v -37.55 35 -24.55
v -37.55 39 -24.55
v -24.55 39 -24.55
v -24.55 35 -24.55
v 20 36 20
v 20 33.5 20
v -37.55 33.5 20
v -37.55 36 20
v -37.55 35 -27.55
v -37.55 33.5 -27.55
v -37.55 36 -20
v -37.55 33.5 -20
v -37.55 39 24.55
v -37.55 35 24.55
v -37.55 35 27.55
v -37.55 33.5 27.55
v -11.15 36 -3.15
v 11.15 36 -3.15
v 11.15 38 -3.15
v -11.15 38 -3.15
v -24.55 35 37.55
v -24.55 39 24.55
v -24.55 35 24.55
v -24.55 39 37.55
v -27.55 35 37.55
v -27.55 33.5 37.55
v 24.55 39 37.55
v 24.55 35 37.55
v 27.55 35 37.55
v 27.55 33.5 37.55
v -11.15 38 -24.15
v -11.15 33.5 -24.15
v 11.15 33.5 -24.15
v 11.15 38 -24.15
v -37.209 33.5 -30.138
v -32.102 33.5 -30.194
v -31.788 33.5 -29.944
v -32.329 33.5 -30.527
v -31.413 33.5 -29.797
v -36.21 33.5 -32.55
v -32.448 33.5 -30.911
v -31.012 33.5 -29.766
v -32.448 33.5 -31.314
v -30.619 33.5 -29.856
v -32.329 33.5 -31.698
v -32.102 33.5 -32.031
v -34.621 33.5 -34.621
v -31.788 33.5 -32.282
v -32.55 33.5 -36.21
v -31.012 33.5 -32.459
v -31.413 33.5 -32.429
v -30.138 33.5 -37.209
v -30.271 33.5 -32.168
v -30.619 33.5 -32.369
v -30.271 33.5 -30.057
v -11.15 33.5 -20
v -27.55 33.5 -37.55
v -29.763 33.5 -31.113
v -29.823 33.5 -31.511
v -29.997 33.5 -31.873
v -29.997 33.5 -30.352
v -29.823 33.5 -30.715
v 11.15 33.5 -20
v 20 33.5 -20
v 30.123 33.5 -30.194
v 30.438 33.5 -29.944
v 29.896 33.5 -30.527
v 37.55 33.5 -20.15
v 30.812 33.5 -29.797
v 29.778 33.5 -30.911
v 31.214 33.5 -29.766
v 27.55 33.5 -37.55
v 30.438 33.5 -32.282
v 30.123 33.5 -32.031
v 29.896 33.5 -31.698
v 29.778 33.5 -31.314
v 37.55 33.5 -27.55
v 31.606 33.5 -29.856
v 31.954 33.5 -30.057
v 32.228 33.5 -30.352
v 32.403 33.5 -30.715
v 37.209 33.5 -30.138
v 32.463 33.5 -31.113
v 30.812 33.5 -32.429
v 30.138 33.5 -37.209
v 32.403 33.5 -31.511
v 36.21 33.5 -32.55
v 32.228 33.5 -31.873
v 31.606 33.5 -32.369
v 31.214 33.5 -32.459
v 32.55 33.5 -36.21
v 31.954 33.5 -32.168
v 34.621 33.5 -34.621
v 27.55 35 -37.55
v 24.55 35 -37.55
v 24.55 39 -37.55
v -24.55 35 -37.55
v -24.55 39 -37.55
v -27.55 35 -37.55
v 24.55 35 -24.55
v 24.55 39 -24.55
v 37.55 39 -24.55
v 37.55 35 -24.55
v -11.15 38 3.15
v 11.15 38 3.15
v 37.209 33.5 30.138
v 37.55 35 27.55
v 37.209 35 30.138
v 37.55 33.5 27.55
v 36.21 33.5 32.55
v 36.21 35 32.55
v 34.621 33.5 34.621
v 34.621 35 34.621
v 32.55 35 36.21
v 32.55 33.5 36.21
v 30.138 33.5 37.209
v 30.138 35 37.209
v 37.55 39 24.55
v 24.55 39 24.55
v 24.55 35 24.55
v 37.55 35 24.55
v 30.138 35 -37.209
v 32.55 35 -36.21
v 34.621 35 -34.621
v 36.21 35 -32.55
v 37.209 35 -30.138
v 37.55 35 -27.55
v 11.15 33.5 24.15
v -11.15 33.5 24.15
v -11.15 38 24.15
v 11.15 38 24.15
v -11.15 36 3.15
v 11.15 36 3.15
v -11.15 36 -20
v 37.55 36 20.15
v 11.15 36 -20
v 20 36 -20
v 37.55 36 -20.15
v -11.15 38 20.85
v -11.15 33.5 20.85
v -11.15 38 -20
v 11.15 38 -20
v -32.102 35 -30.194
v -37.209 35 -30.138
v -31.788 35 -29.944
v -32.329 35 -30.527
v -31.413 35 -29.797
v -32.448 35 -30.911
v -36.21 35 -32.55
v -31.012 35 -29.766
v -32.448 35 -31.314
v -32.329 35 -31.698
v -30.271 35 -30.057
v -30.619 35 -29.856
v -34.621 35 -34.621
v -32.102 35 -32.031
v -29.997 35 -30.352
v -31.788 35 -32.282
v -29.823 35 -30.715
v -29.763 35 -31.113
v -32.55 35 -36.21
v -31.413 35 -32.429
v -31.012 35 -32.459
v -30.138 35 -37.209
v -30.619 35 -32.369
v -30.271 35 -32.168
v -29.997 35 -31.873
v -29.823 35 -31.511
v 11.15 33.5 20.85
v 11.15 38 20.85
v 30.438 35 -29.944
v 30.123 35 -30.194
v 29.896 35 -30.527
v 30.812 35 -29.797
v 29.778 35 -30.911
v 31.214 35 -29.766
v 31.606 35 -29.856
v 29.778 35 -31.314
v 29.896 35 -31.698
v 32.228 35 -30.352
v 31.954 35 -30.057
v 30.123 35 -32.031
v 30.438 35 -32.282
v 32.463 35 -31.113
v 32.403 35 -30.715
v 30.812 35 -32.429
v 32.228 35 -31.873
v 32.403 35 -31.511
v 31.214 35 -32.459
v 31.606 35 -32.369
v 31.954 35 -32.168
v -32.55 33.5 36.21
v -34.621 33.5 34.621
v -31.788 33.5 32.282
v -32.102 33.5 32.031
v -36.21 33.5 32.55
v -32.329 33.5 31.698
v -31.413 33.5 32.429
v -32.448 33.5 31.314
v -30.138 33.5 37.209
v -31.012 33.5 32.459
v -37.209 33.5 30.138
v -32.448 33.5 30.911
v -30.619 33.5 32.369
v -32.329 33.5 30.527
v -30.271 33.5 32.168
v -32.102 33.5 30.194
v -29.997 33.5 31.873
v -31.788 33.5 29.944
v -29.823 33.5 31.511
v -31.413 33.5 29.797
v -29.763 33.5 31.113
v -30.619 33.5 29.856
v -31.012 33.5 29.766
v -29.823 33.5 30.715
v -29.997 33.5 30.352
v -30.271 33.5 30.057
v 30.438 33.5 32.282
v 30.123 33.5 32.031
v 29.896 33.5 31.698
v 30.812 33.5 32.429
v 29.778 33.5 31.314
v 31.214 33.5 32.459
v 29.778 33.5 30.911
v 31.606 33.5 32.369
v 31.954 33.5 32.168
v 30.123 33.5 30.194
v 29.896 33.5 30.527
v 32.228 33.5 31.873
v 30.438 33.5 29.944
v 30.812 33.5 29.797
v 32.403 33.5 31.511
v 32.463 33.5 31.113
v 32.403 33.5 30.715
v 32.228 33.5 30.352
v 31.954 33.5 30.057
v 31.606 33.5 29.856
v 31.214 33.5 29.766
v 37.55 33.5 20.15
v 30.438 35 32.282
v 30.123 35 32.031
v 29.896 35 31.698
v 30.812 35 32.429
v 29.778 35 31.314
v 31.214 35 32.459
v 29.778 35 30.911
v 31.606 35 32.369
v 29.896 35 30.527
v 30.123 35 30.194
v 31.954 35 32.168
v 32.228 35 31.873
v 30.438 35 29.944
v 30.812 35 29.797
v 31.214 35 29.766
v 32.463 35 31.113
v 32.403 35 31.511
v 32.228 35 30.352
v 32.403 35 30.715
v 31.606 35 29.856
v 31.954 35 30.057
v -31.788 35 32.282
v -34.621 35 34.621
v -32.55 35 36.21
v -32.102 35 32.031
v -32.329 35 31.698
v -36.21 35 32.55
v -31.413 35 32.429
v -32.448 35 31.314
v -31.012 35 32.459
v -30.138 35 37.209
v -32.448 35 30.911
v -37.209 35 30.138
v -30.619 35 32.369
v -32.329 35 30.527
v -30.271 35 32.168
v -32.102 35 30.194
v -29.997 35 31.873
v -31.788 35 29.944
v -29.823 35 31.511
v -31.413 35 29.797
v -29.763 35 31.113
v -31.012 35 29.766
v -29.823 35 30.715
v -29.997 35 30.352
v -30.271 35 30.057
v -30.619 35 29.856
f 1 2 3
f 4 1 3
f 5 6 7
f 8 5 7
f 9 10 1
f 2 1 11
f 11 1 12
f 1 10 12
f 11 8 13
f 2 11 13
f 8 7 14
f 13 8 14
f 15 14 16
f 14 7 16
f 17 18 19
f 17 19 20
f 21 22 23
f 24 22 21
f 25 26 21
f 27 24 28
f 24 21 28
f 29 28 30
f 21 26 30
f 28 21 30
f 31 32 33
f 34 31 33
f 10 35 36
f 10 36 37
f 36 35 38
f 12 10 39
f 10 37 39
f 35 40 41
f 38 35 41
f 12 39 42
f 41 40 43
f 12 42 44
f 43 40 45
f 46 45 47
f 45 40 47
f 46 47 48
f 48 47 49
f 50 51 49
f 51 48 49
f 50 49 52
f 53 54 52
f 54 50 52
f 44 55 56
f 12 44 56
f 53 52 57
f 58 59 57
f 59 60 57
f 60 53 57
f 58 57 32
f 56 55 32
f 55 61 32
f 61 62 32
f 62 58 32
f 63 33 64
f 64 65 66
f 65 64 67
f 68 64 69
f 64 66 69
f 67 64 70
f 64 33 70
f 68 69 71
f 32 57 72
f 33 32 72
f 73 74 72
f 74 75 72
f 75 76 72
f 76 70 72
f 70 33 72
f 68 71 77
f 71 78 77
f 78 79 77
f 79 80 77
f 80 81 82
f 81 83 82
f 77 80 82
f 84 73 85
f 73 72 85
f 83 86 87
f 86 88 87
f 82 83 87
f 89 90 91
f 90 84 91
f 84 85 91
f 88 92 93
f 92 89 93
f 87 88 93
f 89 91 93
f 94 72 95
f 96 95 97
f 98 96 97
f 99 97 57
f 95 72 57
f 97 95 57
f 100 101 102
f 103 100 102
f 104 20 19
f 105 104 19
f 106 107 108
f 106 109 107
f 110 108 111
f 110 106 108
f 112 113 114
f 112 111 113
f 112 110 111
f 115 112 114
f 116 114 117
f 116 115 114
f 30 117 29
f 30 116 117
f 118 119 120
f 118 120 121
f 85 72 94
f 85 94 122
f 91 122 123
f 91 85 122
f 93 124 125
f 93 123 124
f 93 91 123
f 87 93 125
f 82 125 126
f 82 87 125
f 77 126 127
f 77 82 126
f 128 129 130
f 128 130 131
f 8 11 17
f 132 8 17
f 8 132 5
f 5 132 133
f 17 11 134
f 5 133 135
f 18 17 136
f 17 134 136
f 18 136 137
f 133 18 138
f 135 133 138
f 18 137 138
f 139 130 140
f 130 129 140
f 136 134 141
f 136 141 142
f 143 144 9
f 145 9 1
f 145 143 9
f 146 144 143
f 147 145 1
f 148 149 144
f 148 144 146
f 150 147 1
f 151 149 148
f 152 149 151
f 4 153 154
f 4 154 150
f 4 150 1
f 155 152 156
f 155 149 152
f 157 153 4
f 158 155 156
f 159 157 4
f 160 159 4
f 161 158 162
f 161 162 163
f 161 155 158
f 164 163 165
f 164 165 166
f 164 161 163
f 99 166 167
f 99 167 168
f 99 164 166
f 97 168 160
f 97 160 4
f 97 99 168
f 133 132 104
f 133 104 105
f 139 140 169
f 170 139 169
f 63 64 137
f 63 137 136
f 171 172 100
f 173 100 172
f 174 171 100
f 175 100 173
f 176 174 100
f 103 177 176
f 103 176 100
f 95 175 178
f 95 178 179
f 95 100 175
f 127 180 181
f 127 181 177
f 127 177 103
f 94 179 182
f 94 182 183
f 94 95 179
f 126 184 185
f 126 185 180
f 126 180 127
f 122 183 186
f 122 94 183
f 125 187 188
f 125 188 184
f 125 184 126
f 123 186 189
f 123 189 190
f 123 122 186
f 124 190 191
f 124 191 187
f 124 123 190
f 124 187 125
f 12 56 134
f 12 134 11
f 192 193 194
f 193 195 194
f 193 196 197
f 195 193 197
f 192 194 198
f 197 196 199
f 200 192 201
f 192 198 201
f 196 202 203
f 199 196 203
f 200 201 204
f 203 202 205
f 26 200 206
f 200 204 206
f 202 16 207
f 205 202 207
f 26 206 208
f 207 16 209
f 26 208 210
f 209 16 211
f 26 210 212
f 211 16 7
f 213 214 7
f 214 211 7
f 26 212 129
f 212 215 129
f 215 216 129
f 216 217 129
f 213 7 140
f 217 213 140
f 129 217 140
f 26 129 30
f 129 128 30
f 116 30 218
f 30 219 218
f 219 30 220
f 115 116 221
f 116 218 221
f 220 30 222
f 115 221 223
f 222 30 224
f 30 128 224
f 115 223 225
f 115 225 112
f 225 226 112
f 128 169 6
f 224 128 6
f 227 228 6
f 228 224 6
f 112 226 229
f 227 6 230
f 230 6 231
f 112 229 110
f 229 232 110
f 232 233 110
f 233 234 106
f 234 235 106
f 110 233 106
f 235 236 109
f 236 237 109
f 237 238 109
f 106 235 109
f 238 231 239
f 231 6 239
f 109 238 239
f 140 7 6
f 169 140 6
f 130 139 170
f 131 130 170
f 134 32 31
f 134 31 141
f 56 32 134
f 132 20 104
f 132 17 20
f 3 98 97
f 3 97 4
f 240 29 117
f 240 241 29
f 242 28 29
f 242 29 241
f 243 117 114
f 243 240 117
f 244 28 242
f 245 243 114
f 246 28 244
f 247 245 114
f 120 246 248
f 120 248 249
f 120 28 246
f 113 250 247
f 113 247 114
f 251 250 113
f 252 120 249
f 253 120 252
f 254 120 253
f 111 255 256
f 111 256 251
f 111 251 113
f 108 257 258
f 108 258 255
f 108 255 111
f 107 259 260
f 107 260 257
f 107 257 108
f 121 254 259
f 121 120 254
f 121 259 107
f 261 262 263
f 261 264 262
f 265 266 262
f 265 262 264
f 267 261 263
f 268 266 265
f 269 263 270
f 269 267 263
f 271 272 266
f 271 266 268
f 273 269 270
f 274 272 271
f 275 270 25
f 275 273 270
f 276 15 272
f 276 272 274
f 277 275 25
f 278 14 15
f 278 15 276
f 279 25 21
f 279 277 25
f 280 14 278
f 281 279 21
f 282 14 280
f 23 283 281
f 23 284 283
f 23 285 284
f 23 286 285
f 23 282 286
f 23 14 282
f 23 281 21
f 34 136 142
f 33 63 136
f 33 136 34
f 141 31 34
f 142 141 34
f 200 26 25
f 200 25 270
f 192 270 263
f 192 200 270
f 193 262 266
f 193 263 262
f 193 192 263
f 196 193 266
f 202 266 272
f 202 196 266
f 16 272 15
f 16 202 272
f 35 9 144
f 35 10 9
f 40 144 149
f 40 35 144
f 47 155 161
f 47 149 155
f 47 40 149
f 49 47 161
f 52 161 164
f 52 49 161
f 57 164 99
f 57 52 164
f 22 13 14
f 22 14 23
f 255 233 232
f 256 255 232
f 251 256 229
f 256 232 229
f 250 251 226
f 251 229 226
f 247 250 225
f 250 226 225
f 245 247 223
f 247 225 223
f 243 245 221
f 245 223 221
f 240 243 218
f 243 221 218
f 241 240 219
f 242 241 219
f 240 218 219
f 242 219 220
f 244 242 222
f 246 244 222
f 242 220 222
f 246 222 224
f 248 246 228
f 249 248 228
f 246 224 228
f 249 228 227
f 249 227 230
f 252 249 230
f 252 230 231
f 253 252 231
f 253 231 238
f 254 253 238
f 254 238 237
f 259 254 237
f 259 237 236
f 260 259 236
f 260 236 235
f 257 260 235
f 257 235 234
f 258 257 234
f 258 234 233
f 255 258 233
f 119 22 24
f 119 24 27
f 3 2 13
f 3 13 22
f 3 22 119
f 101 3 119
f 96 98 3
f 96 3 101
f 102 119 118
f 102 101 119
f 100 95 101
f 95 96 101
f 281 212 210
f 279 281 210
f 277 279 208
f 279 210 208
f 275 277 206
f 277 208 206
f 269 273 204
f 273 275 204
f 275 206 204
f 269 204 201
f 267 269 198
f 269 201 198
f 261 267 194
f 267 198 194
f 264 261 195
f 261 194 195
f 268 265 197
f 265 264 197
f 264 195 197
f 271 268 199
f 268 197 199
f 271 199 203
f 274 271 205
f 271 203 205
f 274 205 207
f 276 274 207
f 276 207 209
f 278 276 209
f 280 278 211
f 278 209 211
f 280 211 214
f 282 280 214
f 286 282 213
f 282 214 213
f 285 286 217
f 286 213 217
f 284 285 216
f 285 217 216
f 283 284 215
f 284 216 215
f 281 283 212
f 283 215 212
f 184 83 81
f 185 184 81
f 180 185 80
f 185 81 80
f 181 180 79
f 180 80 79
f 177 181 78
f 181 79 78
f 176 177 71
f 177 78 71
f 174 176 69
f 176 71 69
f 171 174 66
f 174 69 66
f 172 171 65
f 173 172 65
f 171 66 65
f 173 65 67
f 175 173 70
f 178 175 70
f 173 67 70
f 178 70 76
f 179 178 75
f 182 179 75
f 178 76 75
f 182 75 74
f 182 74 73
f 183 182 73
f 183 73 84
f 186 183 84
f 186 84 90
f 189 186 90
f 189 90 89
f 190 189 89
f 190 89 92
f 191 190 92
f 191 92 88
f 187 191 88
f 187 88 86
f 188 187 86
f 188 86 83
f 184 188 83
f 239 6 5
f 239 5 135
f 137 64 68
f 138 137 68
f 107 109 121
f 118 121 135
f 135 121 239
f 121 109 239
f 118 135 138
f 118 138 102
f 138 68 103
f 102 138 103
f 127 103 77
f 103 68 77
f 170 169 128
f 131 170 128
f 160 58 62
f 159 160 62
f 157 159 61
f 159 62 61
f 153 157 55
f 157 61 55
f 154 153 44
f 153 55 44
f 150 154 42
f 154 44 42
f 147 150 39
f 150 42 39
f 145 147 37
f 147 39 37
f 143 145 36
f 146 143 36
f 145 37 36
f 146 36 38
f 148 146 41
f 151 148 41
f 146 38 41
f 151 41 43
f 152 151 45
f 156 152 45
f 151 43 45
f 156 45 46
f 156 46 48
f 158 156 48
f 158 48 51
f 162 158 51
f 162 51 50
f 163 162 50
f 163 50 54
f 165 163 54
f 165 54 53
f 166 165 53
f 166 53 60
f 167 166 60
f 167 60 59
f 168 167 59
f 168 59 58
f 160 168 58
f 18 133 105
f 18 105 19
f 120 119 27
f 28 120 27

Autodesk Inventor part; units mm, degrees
ref_plane "YZ Plane" through (0, 0, 0) normal (1, 0, 0) x (0, 1, 0)
ref_plane "XZ Plane" through (0, 0, 0) normal (0, 1, 0) x (-1, 0, 0)
ref_plane "XY Plane" through (0, 0, 0) normal (0, 0, 1) x (1, 0, 0)
sketch "スケッチ1" plane through (0, 0, 0) normal (0, 1, 0) x (-1, 0, 0)
  line L0 (37.55, 37.55) -> (-37.55, 37.55)
  line L1 (-37.55, 37.55) -> (-37.55, -37.55)
  line L2 (-37.55, -37.55) -> (37.55, -37.55)
  line L3 (37.55, -37.55) -> (37.55, 37.55)
  line L4 (37.55, 37.55) -> (-37.55, -37.55) construction
  line L5 (-37.55, 37.55) -> (37.55, -37.55) construction
  line L6 (36.55, 36.55) -> (-36.55, 36.55)
  line L7 (-36.55, 36.55) -> (-36.55, -36.55)
  line L8 (-36.55, -36.55) -> (36.55, -36.55)
  line L9 (36.55, -36.55) -> (36.55, 36.55)
  line L10 (52.57, 0) -> (-52.57, 0) construction
  line L11 (0, -52.57) -> (0, 52.57) construction
  line L12 (14, -25) -> (-14, -25)
  line L13 (-14, -25) -> (-14, -35.5)
  line L14 (-14, -35.5) -> (14, -35.5)
  line L15 (14, -35.5) -> (14, -25)
  line L16 (14, -25) -> (-14, -35.5) construction
  line L17 (-14, -25) -> (14, -35.5) construction
  line L18 (0, 37.55) -> (0, -37.55) construction
  circle A0 centre (-13.68, -10.17) radius 1.6
  line L19 (14, -30.25) -> (-14, -30.25) construction
  line L20 (-11.15, 0) -> (-11.15, -24)
  line L21 (11.15, -24) -> (11.15, 0)
  line L22 (-11.15, 12.7) -> (-36.55, 12.7)
  line L23 (-36.55, 12.7) -> (-36.55, -12.7) construction
  line L24 (-36.55, -12.7) -> (-11.15, -12.7)
  line L25 (-11.15, -12.7) -> (-11.15, 12.7) construction
  line L26 (-11.15, 12.7) -> (-36.55, -12.7) construction
  line L27 (-36.55, 12.7) -> (-11.15, -12.7) construction
  line L28 (-13.68, 10.17) -> (-34.02, 10.17) construction
  line L29 (-34.02, 10.17) -> (-34.02, -10.17) construction
  line L30 (-34.02, -10.17) -> (-13.68, -10.17) construction
  line L31 (-13.68, -10.17) -> (-13.68, 10.17) construction
  line L32 (-13.68, 10.17) -> (-34.02, -10.17) construction
  line L33 (-34.02, 10.17) -> (-13.68, -10.17) construction
  circle A1 centre (-13.68, 10.17) radius 1.6
  circle A2 centre (-34.02, 10.17) radius 1.6
  circle A3 centre (-34.02, -10.17) radius 1.6
  line L34 (11.15, 0) -> (-11.15, 0) construction
  line L35 (11.15, -24) -> (-11.15, -24)
  line L36 (8.8, -24) -> (-8.8, -24) construction
  line L37 (-8.8, -24) -> (-8.8, -27)
  line L38 (-8.8, -27) -> (8.8, -27)
  line L39 (8.8, -27) -> (8.8, -24)
  line L40 (8.8, -24) -> (-8.8, -27) construction
  line L41 (-8.8, -24) -> (8.8, -27) construction
  line L42 (11.15, -3) -> (12, -3)
  line L43 (12, -3) -> (12, -9)
  line L44 (12, -9) -> (11.15, -9)
  line L45 (11.15, -12) -> (-11.15, -12) construction
  line L46 (12, -6) -> (-12, -6) construction
  line L47 (11.15, -21) -> (12, -21)
  line L48 (12, -21) -> (12, -15)
  line L49 (12, -15) -> (11.15, -15)
  line L50 (-11.15, -3) -> (-12, -3)
  line L51 (-12, -3) -> (-12, -9)
  line L52 (-12, -9) -> (-11.15, -9)
  line L53 (-12, -15) -> (-11.15, -15)
  line L54 (-12, -21) -> (-12, -15)
  line L55 (-11.15, -21) -> (-12, -21)
  line L56 (14, 25) -> (-14, 25)
  line L57 (-14, 25) -> (-14, 35.5)
  line L58 (-14, 35.5) -> (14, 35.5)
  line L59 (14, 35.5) -> (14, 25)
  line L60 (-11.15, 0) -> (-11.15, 24)
  line L61 (11.15, 24) -> (11.15, 0)
  line L62 (11.15, 24) -> (-11.15, 24)
  line L63 (8.8, 24) -> (-8.8, 24) construction
  line L64 (-8.8, 24) -> (-8.8, 27)
  line L65 (-8.8, 27) -> (8.8, 27)
  line L66 (8.8, 27) -> (8.8, 24)
  line L67 (11.15, 3) -> (12, 3)
  line L68 (12, 3) -> (12, 9)
  line L69 (12, 9) -> (11.15, 9)
  line L70 (12, 15) -> (11.15, 15)
  line L71 (12, 21) -> (12, 15)
  line L72 (11.15, 21) -> (12, 21)
  line L73 (-12, 3) -> (-12, 9)
  line L74 (-11.15, 3) -> (-12, 3)
  line L75 (-12, 9) -> (-11.15, 9)
  line L76 (-12, 21) -> (-12, 15)
  line L77 (-12, 15) -> (-11.15, 15)
  line L78 (-11.15, 21) -> (-12, 21)
  line L79 (15, 33.5) -> (29, 33.5)
  line L80 (29, 33.5) -> (29, -33.5)
  line L81 (29, -33.5) -> (15, -33.5)
  line L82 (15, -33.5) -> (15, 33.5)
  line L83 (15, 33.5) -> (29, -33.5) construction
  line L84 (29, 33.5) -> (15, -33.5) construction
  line L85 (-33.85, 20) -> (-13.85, 20)
  line L86 (-13.85, 20) -> (-13.85, -20)
  line L87 (-13.85, -20) -> (-33.85, -20)
  line L88 (-33.85, -20) -> (-33.85, 20)
  line L89 (-33.85, 20) -> (-13.85, -20) construction
  line L90 (-13.85, 20) -> (-33.85, -20) construction
  line L91 (37.55, 25.5) -> (15, 25.5) construction
  circle A4 centre (-21, -30.25) radius 3.1
  line L92 (-21, -37.55) -> (-21, 37.55) construction
  circle A5 centre (-21, 30.25) radius 3.1
  circle A6 centre (21, -30.25) radius 3.1
  circle A7 centre (21, 30.25) radius 3.1
  circle A8 centre (-21, -30.25) radius 4.1
  circle A9 centre (-21, 30.25) radius 4.1
  circle A10 centre (21, -30.25) radius 4.1
  circle A11 centre (21, 30.25) radius 4.1
  circle A12 centre (33, 0) radius 2.6
  circle A13 centre (33, 0) radius 3.5
  circle A14 centre (-33, 0) radius 2.6
  circle A15 centre (-33, 0) radius 3.5
  line L93 (-27.85, 4) -> (-19.85, 4)
  line L94 (-19.85, 4) -> (-19.85, -4)
  line L95 (-19.85, -4) -> (-27.85, -4)
  line L96 (-27.85, -4) -> (-27.85, 4)
  line L97 (-27.85, 4) -> (-19.85, -4) construction
  line L98 (-19.85, 4) -> (-27.85, -4) construction
  line L99 (26, -34) -> (18, -34)
  line L100 (18, -34) -> (18, -33.5)
  line L101 (18, -33.5) -> (26, -33.5) construction
  line L102 (26, -33.5) -> (26, -34)
  line L103 (26, -34) -> (18, -33.5) construction
  line L104 (18, -34) -> (26, -33.5) construction
  line L105 (22, -33.5) -> (22, 33.5) construction
  line L106 (-11.15, 24) -> (-11.15, 25)
  line L107 (11.15, 24) -> (11.15, 25)
  line L108 (11.15, -24) -> (11.15, -25)
  line L109 (-11.15, -24) -> (-11.15, -25)
  line L110 (14, 25) -> (14, 24)
  line L111 (14, 24) -> (11.15, 24)
  line L112 (-11.15, 24) -> (-14, 24)
  line L113 (-14, 24) -> (-14, 25)
  line L114 (14, -25) -> (14, -24)
  line L115 (14, -24) -> (11.15, -24)
  line L116 (-11.15, -24) -> (-14, -24)
  line L117 (-14, -24) -> (-14, -25)
  point P0 (0, 0)
  point P1 (0, -30.25)
  point P2 (-23.85, 0)
  point P3 (0, -25.5)
  point P4 (0, 0)
  point P5 (0, -6)
  point P6 (-12, 6)
  point P7 (12, 6)
  point P8 (22, 0)
  point P9 (-23.85, 0)
  point P10 (22, -33.75)
  dimension "d1" = 1
  dimension "d2" = 10.5
  dimension "d3" = 28
  dimension "d5" = 3.2
  dimension "d11" = 25.4
  dimension "d12" = 20.34
  dimension "d15" = 360
  dimension "d18" = 22.3
  dimension "d19" = 17.6
  dimension "d20" = 27
  dimension "d21" = 24
  dimension "d22" = 1
  dimension "d25" = 24
  dimension "d26" = 12
  dimension "d27" = 6
  dimension "d32" = 67
  dimension "d33" = 14
  dimension "d34" = 1
  dimension "d35" = 40
  dimension "d36" = 20
  dimension "d41" = 8
  dimension "d47" = 6.2
  dimension "d48" = 7
  dimension "d49" = 1
  dimension "d54" = 5.2
  dimension "d55" = 7
  dimension "d56" = 33
  dimension "d86" = 8
  dimension "d110" = 8
  dimension "d111" = 0.5
extrude "押し出し3" add sketch "スケッチ1" along normal blind 33.5 contours L3 L2 L1 L0 | L9 L8 L7 L24 L88 L87 L86 L20 L53 L54 L55 L116 L117 L13 L14 L15 L114 L115 L21 L47 L48 L49 L44 L43 L42 L61 L67 L68 L69 L70 L71 L72 L111 L110 L59 L58 L57 L113 L112 L60 L78 L76 L77 L22 L85 L6 | L22 L88 A2 A15 A3 L24 L7 | L88 L85 L86 L22 | L22 L86 A1 A0 L24 L88 A3 A15 A2 | L24 L86 L87 L88 | L22 L60 L75 L73 L74 L20 L50 L51 L52 L24 L86 A0 A1 | L88 A2 | A2 L88 | L88 A3 | A3 L88 | L60 L62 L61 L21 L35 L20 | L86 A1 | A1 L86 | L86 A0 | A0 L86 | L60 L74 L73 L75 | L77 L76 L78 L60 | A15 L88 A14 | L88 A14 A15 | L52 L51 L50 L20 | L20 L55 L54 L53 | A14 L88 | L88 A14 | L106 L56 L64 L62 | L112 L113 L56 L106 | L35 L37 L12 L109 | L109 L12 L117 L116 | L64 L56 L66 L62 | L56 L57 L58 L59 L66 L65 L64 | L35 L39 L12 L37 | L12 L37 L38 L39 L15 L14 L13 | L66 L56 L107 L62 | L64 L65 L66 L56 | L35 L108 L12 L39 | L12 L39 L38 L37 | L107 L56 L110 L111 | L115 L114 L12 L108 | L72 L71 L70 L61 | L21 L49 L48 L47 | L69 L68 L67 L61 | L21 L42 L43 L44 | L79 A11 L80 L81 A10 L82 | A11 L79 | L79 A11 | L81 A10 L99 L100 | A10 L81 | L81 A10 L99 | L81 L102 L99 A10 | L99 A10 | A4 | A5 | A6 | A7 | A8 | A9 | A12 | A13 | L93 L94 L95 L96
fillet "フィレット1" radius 10 4 edges at (37.55, 16.75, 37.55) (37.55, 16.75, -37.55) (-37.55, 16.75, -37.55) (-37.55, 16.75, 37.55)
extrude "押し出し11" cut sketch "スケッチ1" along normal through all contours L56 L57 L58 L59 L66 L65 L64 | L12 L37 L38 L39 L15 L14 L13 | L64 L65 L66 L56 | L12 L39 L38 L37
extrude "押し出し12" cut sketch "スケッチ1" along normal blind 1.5 contours A4 | A5 | A6 | A7
extrude "押し出し13" cut sketch "スケッチ1" along normal blind 1.5 contours A14 L88 | L88 A14 | A12
sketch "スケッチ5" plane through (0, 0, 0) normal (0, 1, 0) x (-1, 0, 0)
  line L0 (-12, 9) -> (-11.15, 9) projected
  line L1 (-11.15, 0) -> (-11.15, 24) projected
  line L2 (-12, 3) -> (-12, 9) projected
  line L3 (-11.15, 3) -> (-12, 3) projected
  line L4 (-12, 15) -> (-11.15, 15) projected
  line L5 (-12, 21) -> (-12, 15) projected
  line L6 (11.15, 3) -> (12, 3) projected
  line L7 (-11.15, 21) -> (-12, 21) projected
  line L8 (11.15, 21) -> (12, 21) projected
  line L9 (11.15, 24) -> (-11.15, 24) projected
  line L10 (-8.8, 24) -> (-8.8, 27) projected
  line L11 (8.8, 24) -> (-8.8, 24) construction
  line L12 (8.8, 27) -> (8.8, 24) projected
  line L13 (-8.8, 27) -> (8.8, 27) projected
  line L14 (11.15, 0) -> (-11.15, 0) construction
  line L15 (11.15, -12) -> (-11.15, -12) construction
  line L16 (12, -9) -> (11.15, -9) projected
  line L17 (11.15, -3) -> (12, -3) projected
  line L18 (12, -3) -> (12, -9) projected
  line L19 (12, -6) -> (-12, -6) construction
  line L20 (-12, -9) -> (-11.15, -9) projected
  line L21 (-12, -3) -> (-12, -9) projected
  line L22 (-11.15, -3) -> (-12, -3) projected
  line L23 (-11.15, -12.7) -> (-11.15, 12.7) construction
  line L24 (-11.15, 0) -> (-11.15, -24) projected
  line L25 (11.15, -24) -> (11.15, 0) projected
  line L26 (12, -15) -> (11.15, -15) projected
  line L27 (12, -21) -> (12, -15) projected
  line L28 (12, 9) -> (11.15, 9) projected
  line L29 (12, 3) -> (12, 9) projected
  line L30 (12, 15) -> (11.15, 15) projected
  line L31 (12, 21) -> (12, 15) projected
  line L32 (11.15, 24) -> (11.15, 0) projected
  line L33 (11.15, -24) -> (-11.15, -24) projected
  line L34 (8.8, -24) -> (-8.8, -24) construction
  line L35 (-12, -15) -> (-11.15, -15) projected
  line L36 (-12, -21) -> (-12, -15) projected
  line L37 (-11.15, -21) -> (-12, -21) projected
  line L38 (11.15, -21) -> (12, -21) projected
  line L39 (-8.8, -27) -> (8.8, -27) projected
  line L40 (-8.8, -24) -> (-8.8, -27) projected
  line L41 (8.8, -27) -> (8.8, -24) projected
  line L42 (-11.15, -14.85) -> (-12.15, -14.85)
  line L43 (-12.15, -14.85) -> (-12.15, -21.15)
  line L44 (-12.15, -21.15) -> (-11.15, -21.15)
  line L45 (-11.15, -9.15) -> (-12.15, -9.15)
  line L46 (-12.15, -9.15) -> (-12.15, -2.85)
  line L47 (-12.15, -2.85) -> (-11.15, -2.85)
  line L48 (11.15, -14.85) -> (12.15, -14.85)
  line L49 (12.15, -14.85) -> (12.15, -21.15)
  line L50 (12.15, -21.15) -> (11.15, -21.15)
  line L51 (11.15, -9.15) -> (12.15, -9.15)
  line L52 (12.15, -9.15) -> (12.15, -2.85)
  line L53 (12.15, -2.85) -> (11.15, -2.85)
  line L54 (-11.15, 9.15) -> (-12.15, 9.15)
  line L55 (-12.15, 9.15) -> (-12.15, 2.85)
  line L56 (-12.15, 2.85) -> (-11.15, 2.85)
  line L57 (-11.15, 14.85) -> (-12.15, 14.85)
  line L58 (-12.15, 14.85) -> (-12.15, 21.15)
  line L59 (-12.15, 21.15) -> (-11.15, 21.15)
  line L60 (11.15, 14.85) -> (12.15, 14.85)
  line L61 (12.15, 14.85) -> (12.15, 21.15)
  line L62 (12.15, 21.15) -> (11.15, 21.15)
  line L63 (-11.3, -24.15) -> (-11.3, 0)
  line L64 (-11.3, 0) -> (-11.3, 24.15)
  line L65 (-11.3, 24.15) -> (11.3, 24.15)
  line L66 (11.3, 24.15) -> (11.3, 0)
  line L67 (11.3, 0) -> (11.3, -24.15)
  line L68 (11.3, -24.15) -> (-11.3, -24.15)
  line L69 (8.95, 27.15) -> (8.95, 23.85)
  line L70 (8.95, 23.85) -> (-8.95, 23.85)
  line L71 (-8.95, 23.85) -> (-8.95, 27.15)
  line L72 (-8.95, 27.15) -> (8.95, 27.15)
  line L73 (8.95, -27.15) -> (-8.95, -27.15)
  line L74 (-8.95, -27.15) -> (-8.95, -23.85)
  line L75 (-8.95, -23.85) -> (8.95, -23.85)
  line L76 (8.95, -23.85) -> (8.95, -27.15)
  line L77 (11.15, 9.15) -> (12.15, 9.15)
  line L78 (12.15, 9.15) -> (12.15, 2.85)
  line L79 (12.15, 2.85) -> (11.15, 2.85)
  point P0 (0, 0)
  point P1 (0, 0)
  point P2 (-12, 6)
  point P3 (12, 6)
  point P4 (0, -6)
  point P5 (0, 0)
  point P6 (-11.3, -14.85)
  point P7 (-11.3, -21.15)
  point P8 (-8.95, -24.15)
  point P9 (8.95, -24.15)
  point P10 (11.3, -21.15)
  point P11 (11.3, -14.85)
  point P12 (11.3, -9.15)
  point P13 (11.3, -2.85)
  point P14 (11.3, 2.85)
  point P15 (11.3, 9.15)
  point P16 (11.3, 14.85)
  point P17 (11.3, 21.15)
  point P18 (8.95, 24.15)
  point P19 (-8.95, 24.15)
  point P20 (-11.3, 21.15)
  point P21 (-11.3, 14.85)
  point P22 (-11.3, 9.15)
  point P23 (-11.3, 2.85)
  point P24 (-11.3, -2.85)
  point P25 (-11.3, -9.15)
  dimension "d73" = 0.15
  dimension "d74" = 0.15
  dimension "d75" = 0.15
  dimension "d76" = 0.15
  dimension "d77" = 0.15
  dimension "d78" = 0.15
  dimension "d79" = 0.15
  dimension "d80" = 0.15
  dimension "d81" = 0.15
  dimension "d82" = 0.15
  dimension "d83" = 0.15
extrude "押し出し14" cut sketch "スケッチ5" against normal blind 31.5 from surface at 33.5
sketch "スケッチ6" plane through (0, 0, 0) normal (0, 1, 0) x (-1, 0, 0)
  line L0 (-11.15, 12.7) -> (-36.55, 12.7) projected
  circle A0 centre (-13.68, 10.17) radius 1.6 projected
  line L1 (-11.15, 0) -> (-11.15, 24) projected
  line L2 (-11.15, 0) -> (-11.15, -24) projected
  line L3 (-36.55, -12.7) -> (-11.15, -12.7) projected
  line L4 (-36.55, 12.7) -> (-36.55, -12.7) construction
  circle A1 centre (-34.02, -10.17) radius 1.6 projected
  circle A2 centre (-34.02, 10.17) radius 1.6 projected
  circle A3 centre (-13.68, -10.17) radius 1.6 projected
  line L5 (-11.15, 12.85) -> (-36.7, 12.85)
  line L6 (-36.7, 12.85) -> (-36.7, -12.85)
  line L7 (-36.7, -12.85) -> (-11.15, -12.85)
  circle A4 centre (-13.68, 10.17) radius 3
  circle A5 centre (-34.02, 10.17) radius 3
  circle A6 centre (-13.68, -10.17) radius 3
  circle A7 centre (-34.02, -10.17) radius 3
  point P0 (0, 0)
  point P1 (-36.7, -11.5182)
  point P2 (-36.7, -8.8218)
  point P3 (-32.6718, -12.85)
  point P4 (-35.3682, -12.85)
  point P5 (-36.7, 8.8218)
  point P6 (-36.7, 11.5182)
  point P7 (-35.3682, 12.85)
  point P8 (-32.6718, 12.85)
  dimension "d89" = 0.15
  dimension "d92" = 6
extrude "押し出し16" cut sketch "スケッチ6" against normal blind 19.5 from surface at 33.5 contours L1 A4 L0 | L0 A4 L5 L1 | A4 L1 L0 | L0 A4 L5 | A4 L1 L2 A6 L3 A7 L6 A5 L0 | L0 A5 L5 A4 | A5 L6 L0 | L0 A5 L5 | A5 L6 L5 | L5 A5 | L2 A6 L3 | L6 A5 | L2 L3 A6 | A6 L7 A7 L3 | L3 A6 L7 | A7 L3 L6 | L6 A7 | L2 L7 A6 L3 | A7 L7 L3 | A7 L7 L6 | A7 L7 | A0 | A1 | A2 | A3
extrude "押し出し15" cut sketch "スケッチ1" along normal through all contours L88 A2 | A2 L88 | L88 A3 | A3 L88 | L86 A1 | A1 L86 | L86 A0 | A0 L86 | L93 L94 L95 L96
extrude "押し出し17" cut sketch "スケッチ6" along normal blind 4 contours A5 L6 L0 | L0 A5 L5 | L5 A5 | L6 A5 | A7 L3 L6 | L6 A7 | A7 L7 L3 | A7 L7 | A1 | A2
sketch "スケッチ7" plane through (0, 0, 0) normal (0, 1, 0) x (-1, 0, 0)
  line L0 (-33.85, 20) -> (-13.85, 20) projected
  line L1 (-13.85, 20) -> (-13.85, -20) projected
  line L2 (-33.85, -20) -> (-33.85, 20) projected
  line L3 (-13.85, -20) -> (-33.85, -20) projected
  line L4 (-13.7, 20.15) -> (-34, 20.15)
  line L5 (-34, 20.15) -> (-34, -20.15)
  line L6 (-34, -20.15) -> (-13.7, -20.15)
  line L7 (-13.7, -20.15) -> (-13.7, 20.15)
  point P0 (0, 0)
  dimension "d95" = 0.15
extrude "押し出し18" cut sketch "スケッチ7" against normal blind 14.5 from surface at 33.5 contours L0 L1 L3 L2 | L7 L6 L5 L4
sketch "スケッチ9" plane through (0, 0, 0) normal (0, 1, 0) x (-1, 0, 0)
  line L0 (29, 33.5) -> (29, -33.5) projected
  line L1 (29, -33.5) -> (15, -33.5) projected
  line L2 (15, -33.5) -> (15, 33.5) projected
  line L3 (15, 33.5) -> (29, 33.5) projected
  line L4 (29.15, -33.65) -> (29.15, 33.65)
  line L5 (29.15, 33.65) -> (14.85, 33.65)
  line L6 (14.85, 33.65) -> (14.85, -33.65)
  line L7 (14.85, -33.65) -> (29.15, -33.65)
  line L8 (15, -33.5) -> (15, -33.65)
  line L9 (15, 33.5) -> (15, 33.65)
  line L10 (26, -33.5) -> (26, -34) projected
  line L11 (26, -34) -> (18, -34) projected
  line L12 (18, -34) -> (18, -33.5) projected
  line L13 (16, -33.5) -> (16, -36)
  line L14 (16, -36) -> (28, -36)
  line L15 (28, -36) -> (28, -33.5)
  line L16 (28, -36) -> (28, -39.9042)
  line L17 (28, -39.9042) -> (16, -39.9042)
  line L18 (16, -39.9042) -> (16, -36)
  line L19 (17, -33.5) -> (17, -35)
  line L20 (17, -35) -> (27, -35)
  line L21 (27, -35) -> (27, -33.5)
  point P0 (0, 0)
  point P1 (22, -33.5)
  point P2 (18, -33.65)
  point P3 (26, -33.65)
  point P4 (17, -33.65)
  point P5 (27, -33.65)
  dimension "d109" = 0.15
  dimension "d113" = 12
  dimension "d116" = 10
extrude "押し出し21" cut sketch "スケッチ9" against normal blind 31.25 from surface at 33.5 contours L3 L9 L5 L4 L7 L15 L1 L0 | L0 L1 L2 L3 | L2 L8 L7 L6 L5 L9 | L15 L7 L21 L1 | L1 L13 L7 L8 | L21 L7 L10 L1 | L1 L19 L7 L13 | L10 L7 L12 L1 | L21 L20 L19 L7 L12 L11 L10 | L1 L12 L7 L19 | L10 L11 L12 L7
sketch "スケッチ8" plane through (0, 0, 0) normal (1, 0, 0) x (0, 1, 0)
  line L0 (-10.4294, 0) -> (62.5761, 0) construction
  line L1 (0, -52.2157) -> (0, 71.794) construction
  line L2 (30.25, -33.5) -> (3.25, -33.5)
  line L3 (3.25, -33.5) -> (3.25, 33.5)
  line L4 (3.25, 33.5) -> (30.25, 33.5)
  line L5 (30.25, 33.5) -> (30.25, -33.5)
  line L6 (30.25, -33.5) -> (3.25, 33.5) construction
  line L7 (3.25, -33.5) -> (30.25, 33.5) construction
  line L8 (31.25, -34.5) -> (2.25, -34.5)
  line L9 (2.25, -34.5) -> (2.25, 34.5)
  line L10 (2.25, 34.5) -> (31.25, 34.5)
  line L11 (31.25, 34.5) -> (31.25, -34.5)
  line L12 (20.75, 33.5) -> (12.75, 33.5) construction
  line L13 (12.75, 33.5) -> (12.75, 34)
  line L14 (12.75, 34) -> (20.75, 34)
  line L15 (20.75, 34) -> (20.75, 33.5)
  line L16 (20.75, 33.5) -> (12.75, 34) construction
  line L17 (12.75, 33.5) -> (20.75, 34) construction
  line L18 (16.75, -33.5) -> (16.75, 33.5) construction
  line L19 (52.1468, -21.2895) -> (31.25, -21.2895)
  line L20 (31.25, -21.2895) -> (31.25, 21.2895) construction
  line L21 (31.25, 21.2895) -> (52.1468, 21.2895)
  line L22 (52.1468, 21.2895) -> (52.1468, -21.2895)
  line L23 (52.1468, -21.2895) -> (31.25, 21.2895) construction
  line L24 (31.25, -21.2895) -> (52.1468, 21.2895) construction
  line L25 (22.75, 33.5) -> (10.75, 33.5) construction
  line L26 (10.75, 33.5) -> (10.75, 54.0784)
  line L27 (10.75, 54.0784) -> (22.75, 54.0784)
  line L28 (22.75, 54.0784) -> (22.75, 33.5)
  line L29 (22.75, 33.5) -> (10.75, 54.0784) construction
  line L30 (10.75, 33.5) -> (22.75, 54.0784) construction
  line L31 (31.25, -26) -> (2.25, -26)
  line L32 (31.25, 26) -> (2.25, 26)
  point P0 (0, 0)
  point P1 (16.75, 0)
  point P2 (16.75, 33.75)
  point P3 (41.6984, 0)
  point P4 (16.75, 43.7892)
  point P5 (10.75, 34.5)
  point P6 (22.75, 34.5)
  point P7 (30.25, 26)
  point P8 (3.25, 26)
  point P9 (3.25, -26)
  point P10 (30.25, -26)
  dimension "d98" = 27
  dimension "d99" = 67
  dimension "d100" = 1
  dimension "d101" = 0.5
  dimension "d102" = 8
  dimension "d103" = 16.75
  dimension "d106" = 12
  dimension "d117" = 26
extrude "押し出し22" cut sketch "スケッチ8" against normal blind 31.25 from surface at -29.15 contours L31 L3 L32 L5 | L5 L32 L11 L31 | L11 L21 L22 L19
sketch "スケッチ10" plane through (0, 0, 0) normal (0, 0, 1) x (1, 0, 0)
  line L0 (-15, 22.75) -> (-29, 22.75)
  line L1 (-29, 22.75) -> (-29, 10.75)
  line L2 (-29, 10.75) -> (-15, 10.75)
  line L3 (-15, 10.75) -> (-15, 22.75)
  line L4 (-15, 22.75) -> (-29, 10.75) construction
  line L5 (-29, 22.75) -> (-15, 10.75) construction
  line L6 (-34.8, 0) -> (5.8, 0) construction
  point P0 (0, 0)
  point P1 (-15, 0)
  point P2 (-15, 0)
  point P3 (-15, 0)
  point P4 (-22, 16.75)
  dimension "d120" = 14
  dimension "d121" = 12
  dimension "d122" = 16.75
  dimension "d123" = 7
extrude "押し出し23" cut sketch "スケッチ10" along normal through all both and the other way through all
sketch "スケッチ11" plane through (0, 0, 0) normal (0, 1, 0) x (-1, 0, 0)
  circle A0 centre (31.1127, 31.1127) radius 1.35
  line L0 (37.55, 37.55) -> (-37.55, -37.55) construction
  line L1 (-37.55, 37.55) -> (37.55, -37.55) construction
  circle A1 centre (0, 0) radius 44 construction
  circle A2 centre (-31.1127, 31.1127) radius 1.35
  circle A3 centre (-31.1127, -31.1127) radius 1.35
  circle A4 centre (31.1127, -31.1127) radius 1.35
  circle A5 centre (31.1127, 31.1127) radius 2.5
  circle A6 centre (-31.1127, 31.1127) radius 2.5
  circle A7 centre (-31.1127, -31.1127) radius 2.5
  circle A8 centre (31.1127, -31.1127) radius 2.5
  dimension "d127" = 88
  dimension "d126" = 2.7
  dimension "d130" = 360
  dimension "d132" = 5
  dimension "d135" = 360
extrude "押し出し24" cut sketch "スケッチ11" along normal blind 19.5 contours A0 | A2 | A3 | A4 | A5 | A6 | A7 | A8
extrude "押し出し25" cut sketch "スケッチ11" along normal through all contours A0 | A2 | A3 | A4
sketch "スケッチ12" plane through (0, 33.5, 0) normal (0, 1, 0) x (1, 0, 0)
  point P0 (0, 0)
sketch "スケッチ13" plane through (0, 0, 0) normal (0, 1, 0) x (-1, 0, 0)
  circle A0 centre (-31.1127, -31.1127) radius 1.35 projected
  circle A1 centre (-31.1127, 31.1127) radius 1.35 projected
  circle A2 centre (31.1127, -31.1127) radius 1.35 projected
  circle A3 centre (31.1127, 31.1127) radius 1.35 projected
  line L0 (11.3, -21.15) -> (11.3, -24.15) projected
  line L1 (11.3, -24.15) -> (8.95, -24.15) projected
  line L2 (8.95, -24.15) -> (8.95, -25) projected
  line L3 (8.95, -25) -> (14, -25) projected
  line L4 (14, -25) -> (14, -35.5) projected
  line L5 (14, -35.5) -> (-14, -35.5) projected
  line L6 (-14, -35.5) -> (-14, -25) projected
  line L7 (-14, -25) -> (-8.95, -25) projected
  line L8 (-8.95, -25) -> (-8.95, -24.15) projected
  line L9 (-8.95, -24.15) -> (-11.3, -24.15) projected
  line L10 (-11.3, -24.15) -> (-11.3, -21.15) projected
  line L11 (-11.3, -21.15) -> (-12.15, -21.15) projected
  line L12 (-12.15, -21.15) -> (-12.15, -14.85) projected
  line L13 (-12.15, -14.85) -> (-11.3, -14.85) projected
  line L14 (-11.3, -14.85) -> (-11.3, -12.85) projected
  line L15 (-11.3, -12.85) -> (-13.7, -12.85) projected
  line L16 (-13.7, -12.85) -> (-13.7, -20.15) projected
  line L17 (-13.7, -20.15) -> (-34, -20.15) projected
  line L18 (-34, -20.15) -> (-34, -13.1699) projected
  arc A4 (-35.3682, -12.85) -> (-34, -13.1699) centre (-34.02, -10.17) ccw projected
  line L19 (-35.3682, -12.85) -> (-36.7, -12.85) projected
  line L20 (-36.7, -12.85) -> (-36.7, -11.5182) projected
  arc A5 (-36.7, -8.8218) -> (-36.7, -11.5182) centre (-34.02, -10.17) ccw projected
  line L21 (-36.7, -8.8218) -> (-36.7, 8.8218) projected
  arc A6 (-36.7, 11.5182) -> (-36.7, 8.8218) centre (-34.02, 10.17) ccw projected
  line L22 (-36.7, 11.5182) -> (-36.7, 12.85) projected
  line L23 (-36.7, 12.85) -> (-35.3682, 12.85) projected
  arc A7 (-34, 13.1699) -> (-35.3682, 12.85) centre (-34.02, 10.17) ccw projected
  line L24 (-34, 13.1699) -> (-34, 20.15) projected
  line L25 (-34, 20.15) -> (-13.7, 20.15) projected
  line L26 (-13.7, 20.15) -> (-13.7, 12.85) projected
  line L27 (-13.7, 12.85) -> (-11.3, 12.85) projected
  line L28 (-11.3, 12.85) -> (-11.3, 14.85) projected
  line L29 (-11.3, 14.85) -> (-12.15, 14.85) projected
  line L30 (-12.15, 14.85) -> (-12.15, 21.15) projected
  line L31 (-12.15, 21.15) -> (-11.3, 21.15) projected
  line L32 (-11.3, 21.15) -> (-11.3, 24.15) projected
  line L33 (-11.3, 24.15) -> (-8.95, 24.15) projected
  line L34 (-8.95, 24.15) -> (-8.95, 25) projected
  line L35 (-8.95, 25) -> (-14, 25) projected
  line L36 (-14, 25) -> (-14, 35.5) projected
  line L37 (-14, 35.5) -> (14, 35.5) projected
  line L38 (14, 35.5) -> (14, 25) projected
  line L39 (14, 25) -> (8.95, 25) projected
  line L40 (8.95, 25) -> (8.95, 24.15) projected
  line L41 (8.95, 24.15) -> (11.3, 24.15) projected
  line L42 (11.3, 24.15) -> (11.3, 21.15) projected
  line L43 (11.3, 21.15) -> (12.15, 21.15) projected
  line L44 (12.15, 21.15) -> (12.15, 14.85) projected
  line L45 (12.15, 14.85) -> (11.3, 14.85) projected
  line L46 (11.3, 14.85) -> (11.3, 9.15) projected
  line L47 (11.3, 9.15) -> (12.15, 9.15) projected
  line L48 (12.15, 9.15) -> (12.15, 2.85) projected
  line L49 (12.15, 2.85) -> (11.3, 2.85) projected
  line L50 (11.3, 2.85) -> (11.3, -2.85) projected
  line L51 (11.3, -2.85) -> (12.15, -2.85) projected
  line L52 (12.15, -2.85) -> (12.15, -9.15) projected
  line L53 (12.15, -9.15) -> (11.3, -9.15) projected
  line L54 (11.3, -9.15) -> (11.3, -14.85) projected
  line L55 (11.3, -14.85) -> (12.15, -14.85) projected
  line L56 (12.15, -14.85) -> (12.15, -21.15) projected
  line L57 (12.15, -21.15) -> (11.3, -21.15) projected
  line L58 (14.85, -33.65) -> (14.85, 33.65) projected
  line L59 (14.85, 33.65) -> (29.15, 33.65) projected
  line L60 (29.15, 33.65) -> (29.15, 21.2895) projected
  line L61 (29.15, 21.2895) -> (37.55, 21.2895) projected
  line L62 (37.55, 21.2895) -> (37.55, 27.55) projected
  arc A8 (37.55, 27.55) -> (27.55, 37.55) centre (27.55, 27.55) ccw projected
  line L63 (27.55, 37.55) -> (-27.55, 37.55) projected
  arc A9 (-27.55, 37.55) -> (-37.55, 27.55) centre (-27.55, 27.55) ccw projected
  line L64 (-37.55, 27.55) -> (-37.55, -27.55) projected
  arc A10 (-37.55, -27.55) -> (-27.55, -37.55) centre (-27.55, -27.55) ccw projected
  line L65 (-27.55, -37.55) -> (27.55, -37.55) projected
  arc A11 (27.55, -37.55) -> (37.55, -27.55) centre (27.55, -27.55) ccw projected
  line L66 (37.55, -27.55) -> (37.55, -21.2895) projected
  line L67 (37.55, -21.2895) -> (29.15, -21.2895) projected
  line L68 (29.15, -21.2895) -> (29.15, -33.65) projected
  line L69 (29.15, -33.65) -> (27, -33.65) projected
  line L70 (27, -33.65) -> (27, -35) projected
  line L71 (27, -35) -> (17, -35) projected
  line L72 (17, -35) -> (17, -33.65) projected
  line L73 (17, -33.65) -> (14.85, -33.65) projected
  line L74 (-17.55, 24.15) -> (-17.55, 37.55)
  line L75 (-27.55, 37.55) -> (-27.55, 20.15)
  line L76 (-11.3, 24.15) -> (-17.55, 24.15)
  line L77 (-13.7, 12.85) -> (-13.7, -12.85)
  line L78 (-11.3, 12.85) -> (-11.3, 9.15)
  line L79 (-11.3, 9.15) -> (-12.15, 9.15)
  line L80 (-12.15, 9.15) -> (-12.15, -9.15)
  line L81 (-12.15, -9.15) -> (-11.3, -9.15)
  line L82 (-11.3, -9.15) -> (-11.3, -12.85)
  line L83 (-11.15, 0) -> (-11.15, 24) projected
  line L84 (-12, 3) -> (-12, 9) projected
  line L85 (-11.15, 3) -> (-12, 3) projected
  line L86 (-11.15, 0) -> (-11.15, -24) projected
  line L87 (-11.15, -3) -> (-12, -3) projected
  line L88 (-12, -3) -> (-12, -9) projected
  line L89 (-12, -9) -> (-11.15, -9) projected
  line L90 (-12.15, 2.85) -> (-11.3, 2.85)
  line L91 (-11.3, 2.85) -> (-11.3, -2.85)
  line L92 (-11.3, -2.85) -> (-12.15, -2.85)
  line L93 (-12, 9) -> (-11.15, 9) projected
  line L94 (55.4695, 0) -> (-55.4695, 0) construction
  line L95 (-17.55, -24.15) -> (-17.55, -37.55)
  line L96 (-27.55, -37.55) -> (-27.55, -20.15)
  line L97 (-11.3, -24.15) -> (-17.55, -24.15)
  line L98 (-22.55, 37.55) -> (-22.55, -37.55)
  line L99 (-17.55, 24.15) -> (-22.55, 24.15)
  line L100 (-17.55, -24.15) -> (-37.55, -24.15)
  line L101 (-22.55, 24.15) -> (-37.55, 24.15)
  line L102 (-34, -20.15) -> (-37.55, -20.15)
  line L103 (-34, 20.15) -> (-37.55, 20.15)
  line L104 (-27.55, 30.15) -> (-17.55, 30.15)
  line L105 (-27.55, 24.95) -> (-17.55, 24.95)
  line L106 (-27.55, 30.15) -> (-27.55, 24.95)
  line L107 (-17.55, 24.95) -> (-17.55, 30.15)
  line L108 (-17.55, 27.55) -> (-27.55, 27.55) construction
  line L109 (-27.55, -27.55) -> (-17.55, -27.55) construction
  line L110 (-27.55, -30.15) -> (-17.55, -30.15)
  line L111 (-27.55, -24.95) -> (-17.55, -24.95)
  point P0 (0, 0)
  point P1 (-27.55, 24.15)
  point P2 (-27.55, -24.15)
  point P3 (-22.55, 30.15)
  point P4 (-22.55, 24.95)
  point P5 (-22.55, -24.95)
  point P6 (-22.55, -30.15)
  point P7 (-17.55, -24.95)
  dimension "d142" = 10
  dimension "d143" = 0.15
  dimension "d144" = 0.15
  dimension "d145" = 0.15
  dimension "d146" = 0.15
  dimension "d147" = 0.15
  dimension "d148" = 0.15
  dimension "d150" = 5
  dimension "d153" = 5.2
  dimension "d155" = 5.2
  dimension "d162" = 10
  dimension "d163" = 10
  dimension "d164" = 2.6
extrude "押し出し26" cut sketch "スケッチ13" against normal blind 10 from surface at 33.5 contours L97 L100 L98 L17 L16 L15 L14 L13 L12 L11 L10 | L100 L96 L17 L98 | L100 L64 L102 L17 L96 | L96 A10 L64 L100 | L98 L99 L76 L32 L31 L30 L29 L28 L27 L26 L25 | L25 L75 L101 L98 | L15 L77 L27 L78 L79 L80 L81 L82 | L25 L103 L64 L101 L75 | L101 L64 A9 L75 | L80 L90 L91 L92
extrude "押し出し27" cut sketch "スケッチ13" against normal blind 7.8 from surface at 33.5 contours L95 L110 L98 L111 | L98 L104 L74 L105
sketch "スケッチ14" plane through (27.55, 33.5, 37.55) normal (1, 0, 0) x (0, 0, -1)
  line L0 (0, 0) -> (0, -10) projected
  line L1 (0, 0) -> (13.4, 0) projected
  line L2 (0, -10) -> (13.4, -10) projected
  line L3 (13.4, -10) -> (13.4, 0) projected
  line L4 (0, 0) -> (13.4, -10) construction
  line L5 (0, -10) -> (13.4, 0) construction
  line L6 (37.55, -40.2) -> (37.55, 6.7) construction
  line L7 (0, -5) -> (13.4, -5) construction
  circle A0 centre (10, -5) radius 1.35
  circle A1 centre (65.1, -5) radius 1.35
  point P0 (37.55, -33.5)
  dimension "d165" = 2.7
  dimension "d166" = 10
extrude "押し出し29" cut sketch "スケッチ14" against normal up to surface (5 mm away) contours A0 | A1
extrude "押し出し30" cut sketch "スケッチ1" along normal up to surface (33.5 mm away) contours L106 L56 L64 L62 | L35 L37 L12 L109 | L64 L56 L66 L62 | L35 L39 L12 L37 | L66 L56 L107 L62 | L35 L108 L12 L39
extrude "押し出し31" cut sketch "スケッチ1" along normal up to surface (33.5 mm away) contours L112 L113 L56 L106 | L109 L12 L117 L116 | L107 L56 L110 L111 | L115 L114 L12 L108
sketch "スケッチ15" plane through (13.7, 23.5, -20.15) normal (0, 1, 0) x (1, 0, 0)
  line L0 (0.3, -44.15) -> (0.3, -44.3) projected
  line L1 (13.85, -44.3) -> (0.3, -44.3) projected
  line L2 (13.85, -57.7) -> (13.85, -44.3) projected
  arc A0 (13.85, -57.7) -> (23.85, -47.7) centre (13.85, -47.7) ccw projected
  line L3 (23.85, -47.7) -> (23.85, -40.3) projected
  line L4 (20.3, -40.3) -> (23.85, -40.3) projected
  line L5 (20.3, -40.3) -> (0, -40.3) projected
  line L6 (0, -40.3) -> (0, -33) projected
  line L7 (0, -33) -> (-2.4, -33) projected
  line L8 (-2.4, -33) -> (-2.4, -35) projected
  line L9 (-2.4, -35) -> (-1.55, -35) projected
  line L10 (-1.55, -35) -> (-1.55, -41.3) projected
  line L11 (-1.55, -41.3) -> (-2.4, -41.3) projected
  line L12 (-2.4, -41.3) -> (-2.4, -44.15) projected
  line L13 (-2.4, -44.15) -> (0.3, -44.15) projected
  circle A1 centre (17.4127, -51.2627) radius 1.35 projected
  line L14 (0.3, 3.85) -> (-2.4, 3.85) projected
  line L15 (-2.4, 3.85) -> (-2.4, 1) projected
  line L16 (-2.4, 1) -> (-1.55, 1) projected
  line L17 (-1.55, 1) -> (-1.55, -5.3) projected
  line L18 (-1.55, -5.3) -> (-2.4, -5.3) projected
  line L19 (-2.4, -5.3) -> (-2.4, -7.3) projected
  line L20 (-2.4, -7.3) -> (0, -7.3) projected
  line L21 (0, -7.3) -> (0, 0) projected
  line L22 (0, 0) -> (20.3, 0) projected
  line L23 (23.85, 0) -> (20.3, 0) projected
  line L24 (23.85, 0) -> (23.85, 7.4) projected
  arc A2 (23.85, 7.4) -> (13.85, 17.4) centre (13.85, 7.4) ccw projected
  line L25 (13.85, 4) -> (13.85, 17.4) projected
  line L26 (0.3, 4) -> (13.85, 4) projected
  line L27 (0.3, 4) -> (0.3, 3.85) projected
  circle A3 centre (17.4127, 10.9627) radius 1.35 projected
  line L28 (0, -33) -> (0, -7.3)
  line L29 (-2.4, -29.3) -> (-2.4, -33) projected
  line L30 (-1.55, -29.3) -> (-2.4, -29.3) projected
  line L31 (-1.55, -23) -> (-1.55, -29.3) projected
  line L32 (-2.4, -23) -> (-1.55, -23) projected
  line L33 (-2.4, -17.3) -> (-2.4, -23) projected
  line L34 (-1.55, -17.3) -> (-2.4, -17.3) projected
  line L35 (-1.55, -11) -> (-1.55, -17.3) projected
  line L36 (-2.4, -11) -> (-1.55, -11) projected
  line L37 (-2.4, -7.3) -> (-2.4, -11) projected
  point P0 (-13.7, -20.15)
sketch "スケッチ16" plane through (0, 33.5, 0) normal (0, 1, 0) x (1, 0, 0)
  arc A0 (-27.55, 37.55) -> (-37.55, 27.55) centre (-27.55, 27.55) ccw projected
  line L0 (27.55, 37.55) -> (-27.55, 37.55) projected
  arc A1 (37.55, 27.55) -> (27.55, 37.55) centre (27.55, 27.55) ccw projected
  line L1 (37.55, 20.15) -> (37.55, 27.55) projected
  line L2 (37.55, -20.15) -> (37.55, 20.15) projected
  arc A2 (27.55, -37.55) -> (37.55, -27.55) centre (27.55, -27.55) ccw projected
  line L3 (37.55, -27.55) -> (37.55, -20.15) projected
  line L4 (-27.55, -37.55) -> (27.55, -37.55) projected
  arc A3 (-37.55, -27.55) -> (-27.55, -37.55) centre (-27.55, -27.55) ccw projected
  line L5 (-37.55, -21.2895) -> (-37.55, -27.55) projected
  line L6 (-37.55, -26) -> (-37.55, 26) projected
  line L7 (-37.55, 27.55) -> (-37.55, 21.2895) projected
  circle A4 centre (-31.1127, 31.1127) radius 1.35 projected
  circle A5 centre (-31.1127, -31.1127) radius 1.35 projected
  circle A6 centre (31.1127, -31.1127) radius 1.35 projected
  circle A7 centre (31.1127, 31.1127) radius 1.35 projected
  line L8 (20, -20) -> (-20, -20)
  line L9 (-20, -20) -> (-20, 20)
  line L10 (-20, 20) -> (20, 20)
  line L11 (20, 20) -> (20, -20)
  line L12 (20, -20) -> (-20, 20) construction
  line L13 (-20, -20) -> (20, 20) construction
  line L14 (20, 20) -> (37.55, 20.15)
  line L15 (-20, -20) -> (-37.55, -20)
  line L16 (-20, 20) -> (-37.55, 20)
  line L17 (20, -20) -> (37.55, -20.15)
  line L18 (14, -24) -> (-14, -24) projected
  line L19 (-14, 24) -> (14, 24) projected
  line L20 (11.15, 0) -> (11.15, -24) projected
  line L21 (-11.15, -24) -> (-11.15, 0) projected
  line L22 (-11.15, 24) -> (-11.15, 0) projected
  line L23 (11.15, 0) -> (11.15, 24) projected
  line L24 (-11.15, -21) -> (11.15, -21)
  line L25 (55.4695, 0) -> (-55.4695, 0) construction
  line L26 (-11.15, 21) -> (11.15, 21)
  line L27 (-11.15, -3) -> (11.15, -3)
  line L28 (11.15, 3) -> (-11.15, 3)
  line L29 (-11.15, -3.15) -> (11.15, -3.15)
  line L30 (11.15, 3.15) -> (-11.15, 3.15)
  line L31 (-11.15, -24) -> (-11.15, -24.15)
  line L32 (-11.15, -24.15) -> (11.15, -24.15)
  line L33 (11.15, -24.15) -> (11.15, -23.85)
  line L34 (-11.15, 24) -> (-11.15, 24.15)
  line L35 (-11.15, 24.15) -> (11.15, 24.15)
  line L36 (11.15, 24.15) -> (11.15, 24)
  line L37 (-11.15, -20.85) -> (11.15, -20.85)
  line L38 (-11.15, 20.85) -> (11.15, 20.85)
  circle A8 centre (31.1127, 31.1127) radius 2.5 projected
  circle A9 centre (31.1127, -31.1127) radius 2.5 projected
  line L39 (27.55, -37.55) -> (27.55, -24.15) projected
  line L40 (27.55, -27.55) -> (27.55, -37.55)
  line L41 (27.55, -37.55) -> (27.55, -27.55)
  line L42 (-37.55, -24.55) -> (37.55, -24.55)
  line L43 (-37.55, 24.55) -> (37.55, 24.55)
  line L44 (-24.55, 37.55) -> (-24.55, -37.55)
  line L45 (24.55, 37.55) -> (24.55, -37.55)
  point P0 (0, 0)
  point P1 (-11.15, 20)
  point P2 (11.15, 20)
  point P3 (37.55, 27.55)
  point P4 (-11.15, 22.55)
  point P5 (11.15, 22.55)
  point P6 (11.15, -22.55)
  point P7 (-11.15, -22.55)
  point P8 (-24.55, -24.55)
  point P9 (24.55, -24.55)
  point P10 (24.55, 24.55)
  point P11 (-24.55, 24.55)
  dimension "d177" = 40
  dimension "d178" = 40
  dimension "d181" = 3
  dimension "d182" = 3
  dimension "d183" = 3
  dimension "d184" = 3
  dimension "d185" = 0.15
  dimension "d186" = 0.15
  dimension "d187" = 0.15
  dimension "d188" = 0.15
  dimension "d189" = 0.15
  dimension "d190" = 0.15
  dimension "d208" = 3
  dimension "d209" = 3
  dimension "d212" = 3
  dimension "d213" = 3
extrude "押し出し32" cut sketch "スケッチ1" along normal through all contours L3 L2 L1 L0 | L9 L8 L7 L24 L88 L87 L86 L20 L53 L54 L55 L116 L117 L13 L14 L15 L114 L115 L21 L47 L48 L49 L44 L43 L42 L61 L67 L68 L69 L70 L71 L72 L111 L110 L59 L58 L57 L113 L112 L60 L78 L76 L77 L22 L85 L6 | L22 L88 A2 A15 A3 L24 L7 | L88 L85 L86 L22 | L22 L86 A1 A0 L24 L88 A3 A15 A2 | L24 L86 L87 L88 | L22 L60 L75 L73 L74 L20 L50 L51 L52 L24 L86 A0 A1 | L88 A2 | A2 L88 | L88 A3 | A3 L88 | L60 L62 L61 L21 L35 L20 | L86 A1 | A1 L86 | L86 A0 | A0 L86 | L60 L74 L73 L75 | L77 L76 L78 L60 | A15 L88 A14 | L88 A14 A15 | L52 L51 L50 L20 | L20 L55 L54 L53 | A14 L88 | L88 A14 | L106 L56 L64 L62 | L112 L113 L56 L106 | L35 L37 L12 L109 | L109 L12 L117 L116 | L64 L56 L66 L62 | L56 L57 L58 L59 L66 L65 L64 | L35 L39 L12 L37 | L12 L37 L38 L39 L15 L14 L13 | L66 L56 L107 L62 | L64 L65 L66 L56 | L35 L108 L12 L39 | L12 L39 L38 L37 | L107 L56 L110 L111 | L115 L114 L12 L108 | L72 L71 L70 L61 | L21 L49 L48 L47 | L69 L68 L67 L61 | L21 L42 L43 L44 | L79 A11 L80 L81 A10 L82 | A11 L79 | L79 A11 | L81 A10 L99 L100 | A10 L81 | L81 A10 L99 | L81 L102 L99 A10 | L99 A10 | A4 | A5 | A6 | A7 | A8 | A9 | A12 | A13 | L93 L94 L95 L96
extrude "押し出し33" add sketch "スケッチ16" along normal blind 4.5 contours L0 L44 L43 L6 L7 A0 | L0 L45 L43 L44 | L0 A1 L1 L43 L45 | L44 L16 L6 L43 | L43 L45 L14 L10 L23 L36 L35 L34 L22 L16 L44 | L43 L1 L14 L45 | L44 L15 L6 L16 | L16 L9 L15 L44 | L45 L17 L11 L14 | L14 L2 L17 L45 | L10 L22 L21 L8 L9 | L44 L42 L5 L6 L15 | L15 L8 L21 L31 L32 L33 L20 L17 L45 L42 L44 | L11 L8 L20 L23 L10 | L17 L3 L42 L45 | L22 L38 L23 L10 | L10 L23 L30 L22 | L44 L4 A3 L5 L42 | L42 L45 L4 L44 | L42 L39 L4 L45 | L21 L29 L20 L8 | L8 L20 L37 L21 | L22 L26 L23 L38 | L30 L23 L28 L22 | L3 A2 L39 L42 | L37 L20 L24 L21 | L21 L27 L20 L29 | L22 L19 L23 L26 | L28 L23 L20 L27 L21 L22 | L24 L20 L18 L21 | L34 L35 L36 L19 | L18 L33 L32 L31 | A8 | A9
extrude "押し出し34" cut sketch "スケッチ16" along normal blind 2.5 contours L44 L15 L6 L16 | L16 L9 L15 L44 | L45 L17 L11 L14 | L14 L2 L17 L45 | L10 L22 L21 L8 L9 | L11 L8 L20 L23 L10 | L10 L23 L30 L22 | L21 L29 L20 L8 | L30 L23 L28 L22 | L21 L27 L20 L29 | L28 L23 L20 L27 L21 L22
extrude "押し出し35" cut sketch "スケッチ16" along normal up to surface (4.5 mm away) contours L22 L38 L23 L10 | L22 L26 L23 L38 | L30 L23 L28 L22 | L37 L20 L24 L21 | L21 L27 L20 L29 | L22 L19 L23 L26 | L28 L23 L20 L27 L21 L22 | L24 L20 L18 L21 | L34 L35 L36 L19 | L18 L33 L32 L31
sketch "スケッチ17" plane through (0, 38, 0) normal (0, 1, 0) x (1, 0, 0)
  line L0 (11.15, 24.15) -> (11.15, 20) projected
  line L1 (11.15, 20) -> (-11.15, 20) projected
  line L2 (-11.15, 20) -> (-11.15, 24.15) projected
  line L3 (-11.15, 24.15) -> (11.15, 24.15) projected
  line L4 (11.15, -24.15) -> (-11.15, -24.15) projected
  line L5 (-11.15, -24.15) -> (-11.15, -20.85) projected
  line L6 (-11.15, -20.85) -> (11.15, -20.85) projected
  line L7 (11.15, -20.85) -> (11.15, -24.15) projected
  line L8 (11.15, 3.15) -> (11.15, -3.15) projected
  line L9 (11.15, -3.15) -> (-11.15, -3.15) projected
  line L10 (-11.15, -3.15) -> (-11.15, 3.15) projected
  line L11 (-11.15, 3.15) -> (11.15, 3.15) projected
  line L12 (-37.55, 27.55) -> (-37.55, -27.55) projected
  arc A0 (-37.55, -27.55) -> (-27.55, -37.55) centre (-27.55, -27.55) ccw projected
  line L13 (-27.55, -37.55) -> (27.55, -37.55) projected
  arc A1 (27.55, -37.55) -> (37.55, -27.55) centre (27.55, -27.55) ccw projected
  line L14 (37.55, -27.55) -> (37.55, 27.55) projected
  arc A2 (37.55, 27.55) -> (27.55, 37.55) centre (27.55, 27.55) ccw projected
  line L15 (27.55, 37.55) -> (-27.55, 37.55) projected
  arc A3 (-27.55, 37.55) -> (-37.55, 27.55) centre (-27.55, 27.55) ccw projected
  circle A4 centre (31.1127, 31.1127) radius 1.35 projected
  circle A5 centre (31.1127, -31.1127) radius 1.35 projected
  circle A6 centre (-31.1127, -31.1127) radius 1.35 projected
  circle A7 centre (-31.1127, 31.1127) radius 1.35 projected
  point P0 (0, 0)
extrude "押し出し38" add sketch "スケッチ17" along normal blind 1 contours L0 L1 L2 L3 | L4 L5 L6 L7 | L8 L9 L10 L11 | A3 L15 A2 L14 A1 L13 A0 L12
extrude "押し出し42" cut sketch "スケッチ16" against normal blind 4 from surface at 5.5 contours L0 L44 L43 L6 L7 A0 | L0 A1 L1 L43 L45 | L44 L4 A3 L5 L42 | L42 L39 L4 L45 | L3 A2 L39 L42 | A4 | A6 | A7 | A8 | A9
properties part number "enclosure"
